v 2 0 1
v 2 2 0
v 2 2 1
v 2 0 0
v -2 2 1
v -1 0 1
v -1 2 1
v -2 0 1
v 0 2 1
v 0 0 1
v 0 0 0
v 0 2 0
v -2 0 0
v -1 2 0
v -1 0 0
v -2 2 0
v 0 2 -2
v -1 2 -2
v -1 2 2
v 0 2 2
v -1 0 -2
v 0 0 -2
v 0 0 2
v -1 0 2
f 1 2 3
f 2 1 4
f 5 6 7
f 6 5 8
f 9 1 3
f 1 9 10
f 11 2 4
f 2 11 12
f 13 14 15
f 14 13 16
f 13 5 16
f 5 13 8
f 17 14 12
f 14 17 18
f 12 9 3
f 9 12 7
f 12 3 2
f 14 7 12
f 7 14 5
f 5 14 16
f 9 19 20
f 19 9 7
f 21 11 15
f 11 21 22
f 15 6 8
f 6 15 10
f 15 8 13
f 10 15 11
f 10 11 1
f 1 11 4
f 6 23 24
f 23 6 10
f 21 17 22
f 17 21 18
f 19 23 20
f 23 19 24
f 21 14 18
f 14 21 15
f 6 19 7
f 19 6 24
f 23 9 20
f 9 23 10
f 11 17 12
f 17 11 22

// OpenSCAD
module mycube()
{
  translate([-2,0,0])
    cube( size=[4,2,1] );
}

union()
{
  mycube();
  rotate([0,-90,0])
    mycube();
}
